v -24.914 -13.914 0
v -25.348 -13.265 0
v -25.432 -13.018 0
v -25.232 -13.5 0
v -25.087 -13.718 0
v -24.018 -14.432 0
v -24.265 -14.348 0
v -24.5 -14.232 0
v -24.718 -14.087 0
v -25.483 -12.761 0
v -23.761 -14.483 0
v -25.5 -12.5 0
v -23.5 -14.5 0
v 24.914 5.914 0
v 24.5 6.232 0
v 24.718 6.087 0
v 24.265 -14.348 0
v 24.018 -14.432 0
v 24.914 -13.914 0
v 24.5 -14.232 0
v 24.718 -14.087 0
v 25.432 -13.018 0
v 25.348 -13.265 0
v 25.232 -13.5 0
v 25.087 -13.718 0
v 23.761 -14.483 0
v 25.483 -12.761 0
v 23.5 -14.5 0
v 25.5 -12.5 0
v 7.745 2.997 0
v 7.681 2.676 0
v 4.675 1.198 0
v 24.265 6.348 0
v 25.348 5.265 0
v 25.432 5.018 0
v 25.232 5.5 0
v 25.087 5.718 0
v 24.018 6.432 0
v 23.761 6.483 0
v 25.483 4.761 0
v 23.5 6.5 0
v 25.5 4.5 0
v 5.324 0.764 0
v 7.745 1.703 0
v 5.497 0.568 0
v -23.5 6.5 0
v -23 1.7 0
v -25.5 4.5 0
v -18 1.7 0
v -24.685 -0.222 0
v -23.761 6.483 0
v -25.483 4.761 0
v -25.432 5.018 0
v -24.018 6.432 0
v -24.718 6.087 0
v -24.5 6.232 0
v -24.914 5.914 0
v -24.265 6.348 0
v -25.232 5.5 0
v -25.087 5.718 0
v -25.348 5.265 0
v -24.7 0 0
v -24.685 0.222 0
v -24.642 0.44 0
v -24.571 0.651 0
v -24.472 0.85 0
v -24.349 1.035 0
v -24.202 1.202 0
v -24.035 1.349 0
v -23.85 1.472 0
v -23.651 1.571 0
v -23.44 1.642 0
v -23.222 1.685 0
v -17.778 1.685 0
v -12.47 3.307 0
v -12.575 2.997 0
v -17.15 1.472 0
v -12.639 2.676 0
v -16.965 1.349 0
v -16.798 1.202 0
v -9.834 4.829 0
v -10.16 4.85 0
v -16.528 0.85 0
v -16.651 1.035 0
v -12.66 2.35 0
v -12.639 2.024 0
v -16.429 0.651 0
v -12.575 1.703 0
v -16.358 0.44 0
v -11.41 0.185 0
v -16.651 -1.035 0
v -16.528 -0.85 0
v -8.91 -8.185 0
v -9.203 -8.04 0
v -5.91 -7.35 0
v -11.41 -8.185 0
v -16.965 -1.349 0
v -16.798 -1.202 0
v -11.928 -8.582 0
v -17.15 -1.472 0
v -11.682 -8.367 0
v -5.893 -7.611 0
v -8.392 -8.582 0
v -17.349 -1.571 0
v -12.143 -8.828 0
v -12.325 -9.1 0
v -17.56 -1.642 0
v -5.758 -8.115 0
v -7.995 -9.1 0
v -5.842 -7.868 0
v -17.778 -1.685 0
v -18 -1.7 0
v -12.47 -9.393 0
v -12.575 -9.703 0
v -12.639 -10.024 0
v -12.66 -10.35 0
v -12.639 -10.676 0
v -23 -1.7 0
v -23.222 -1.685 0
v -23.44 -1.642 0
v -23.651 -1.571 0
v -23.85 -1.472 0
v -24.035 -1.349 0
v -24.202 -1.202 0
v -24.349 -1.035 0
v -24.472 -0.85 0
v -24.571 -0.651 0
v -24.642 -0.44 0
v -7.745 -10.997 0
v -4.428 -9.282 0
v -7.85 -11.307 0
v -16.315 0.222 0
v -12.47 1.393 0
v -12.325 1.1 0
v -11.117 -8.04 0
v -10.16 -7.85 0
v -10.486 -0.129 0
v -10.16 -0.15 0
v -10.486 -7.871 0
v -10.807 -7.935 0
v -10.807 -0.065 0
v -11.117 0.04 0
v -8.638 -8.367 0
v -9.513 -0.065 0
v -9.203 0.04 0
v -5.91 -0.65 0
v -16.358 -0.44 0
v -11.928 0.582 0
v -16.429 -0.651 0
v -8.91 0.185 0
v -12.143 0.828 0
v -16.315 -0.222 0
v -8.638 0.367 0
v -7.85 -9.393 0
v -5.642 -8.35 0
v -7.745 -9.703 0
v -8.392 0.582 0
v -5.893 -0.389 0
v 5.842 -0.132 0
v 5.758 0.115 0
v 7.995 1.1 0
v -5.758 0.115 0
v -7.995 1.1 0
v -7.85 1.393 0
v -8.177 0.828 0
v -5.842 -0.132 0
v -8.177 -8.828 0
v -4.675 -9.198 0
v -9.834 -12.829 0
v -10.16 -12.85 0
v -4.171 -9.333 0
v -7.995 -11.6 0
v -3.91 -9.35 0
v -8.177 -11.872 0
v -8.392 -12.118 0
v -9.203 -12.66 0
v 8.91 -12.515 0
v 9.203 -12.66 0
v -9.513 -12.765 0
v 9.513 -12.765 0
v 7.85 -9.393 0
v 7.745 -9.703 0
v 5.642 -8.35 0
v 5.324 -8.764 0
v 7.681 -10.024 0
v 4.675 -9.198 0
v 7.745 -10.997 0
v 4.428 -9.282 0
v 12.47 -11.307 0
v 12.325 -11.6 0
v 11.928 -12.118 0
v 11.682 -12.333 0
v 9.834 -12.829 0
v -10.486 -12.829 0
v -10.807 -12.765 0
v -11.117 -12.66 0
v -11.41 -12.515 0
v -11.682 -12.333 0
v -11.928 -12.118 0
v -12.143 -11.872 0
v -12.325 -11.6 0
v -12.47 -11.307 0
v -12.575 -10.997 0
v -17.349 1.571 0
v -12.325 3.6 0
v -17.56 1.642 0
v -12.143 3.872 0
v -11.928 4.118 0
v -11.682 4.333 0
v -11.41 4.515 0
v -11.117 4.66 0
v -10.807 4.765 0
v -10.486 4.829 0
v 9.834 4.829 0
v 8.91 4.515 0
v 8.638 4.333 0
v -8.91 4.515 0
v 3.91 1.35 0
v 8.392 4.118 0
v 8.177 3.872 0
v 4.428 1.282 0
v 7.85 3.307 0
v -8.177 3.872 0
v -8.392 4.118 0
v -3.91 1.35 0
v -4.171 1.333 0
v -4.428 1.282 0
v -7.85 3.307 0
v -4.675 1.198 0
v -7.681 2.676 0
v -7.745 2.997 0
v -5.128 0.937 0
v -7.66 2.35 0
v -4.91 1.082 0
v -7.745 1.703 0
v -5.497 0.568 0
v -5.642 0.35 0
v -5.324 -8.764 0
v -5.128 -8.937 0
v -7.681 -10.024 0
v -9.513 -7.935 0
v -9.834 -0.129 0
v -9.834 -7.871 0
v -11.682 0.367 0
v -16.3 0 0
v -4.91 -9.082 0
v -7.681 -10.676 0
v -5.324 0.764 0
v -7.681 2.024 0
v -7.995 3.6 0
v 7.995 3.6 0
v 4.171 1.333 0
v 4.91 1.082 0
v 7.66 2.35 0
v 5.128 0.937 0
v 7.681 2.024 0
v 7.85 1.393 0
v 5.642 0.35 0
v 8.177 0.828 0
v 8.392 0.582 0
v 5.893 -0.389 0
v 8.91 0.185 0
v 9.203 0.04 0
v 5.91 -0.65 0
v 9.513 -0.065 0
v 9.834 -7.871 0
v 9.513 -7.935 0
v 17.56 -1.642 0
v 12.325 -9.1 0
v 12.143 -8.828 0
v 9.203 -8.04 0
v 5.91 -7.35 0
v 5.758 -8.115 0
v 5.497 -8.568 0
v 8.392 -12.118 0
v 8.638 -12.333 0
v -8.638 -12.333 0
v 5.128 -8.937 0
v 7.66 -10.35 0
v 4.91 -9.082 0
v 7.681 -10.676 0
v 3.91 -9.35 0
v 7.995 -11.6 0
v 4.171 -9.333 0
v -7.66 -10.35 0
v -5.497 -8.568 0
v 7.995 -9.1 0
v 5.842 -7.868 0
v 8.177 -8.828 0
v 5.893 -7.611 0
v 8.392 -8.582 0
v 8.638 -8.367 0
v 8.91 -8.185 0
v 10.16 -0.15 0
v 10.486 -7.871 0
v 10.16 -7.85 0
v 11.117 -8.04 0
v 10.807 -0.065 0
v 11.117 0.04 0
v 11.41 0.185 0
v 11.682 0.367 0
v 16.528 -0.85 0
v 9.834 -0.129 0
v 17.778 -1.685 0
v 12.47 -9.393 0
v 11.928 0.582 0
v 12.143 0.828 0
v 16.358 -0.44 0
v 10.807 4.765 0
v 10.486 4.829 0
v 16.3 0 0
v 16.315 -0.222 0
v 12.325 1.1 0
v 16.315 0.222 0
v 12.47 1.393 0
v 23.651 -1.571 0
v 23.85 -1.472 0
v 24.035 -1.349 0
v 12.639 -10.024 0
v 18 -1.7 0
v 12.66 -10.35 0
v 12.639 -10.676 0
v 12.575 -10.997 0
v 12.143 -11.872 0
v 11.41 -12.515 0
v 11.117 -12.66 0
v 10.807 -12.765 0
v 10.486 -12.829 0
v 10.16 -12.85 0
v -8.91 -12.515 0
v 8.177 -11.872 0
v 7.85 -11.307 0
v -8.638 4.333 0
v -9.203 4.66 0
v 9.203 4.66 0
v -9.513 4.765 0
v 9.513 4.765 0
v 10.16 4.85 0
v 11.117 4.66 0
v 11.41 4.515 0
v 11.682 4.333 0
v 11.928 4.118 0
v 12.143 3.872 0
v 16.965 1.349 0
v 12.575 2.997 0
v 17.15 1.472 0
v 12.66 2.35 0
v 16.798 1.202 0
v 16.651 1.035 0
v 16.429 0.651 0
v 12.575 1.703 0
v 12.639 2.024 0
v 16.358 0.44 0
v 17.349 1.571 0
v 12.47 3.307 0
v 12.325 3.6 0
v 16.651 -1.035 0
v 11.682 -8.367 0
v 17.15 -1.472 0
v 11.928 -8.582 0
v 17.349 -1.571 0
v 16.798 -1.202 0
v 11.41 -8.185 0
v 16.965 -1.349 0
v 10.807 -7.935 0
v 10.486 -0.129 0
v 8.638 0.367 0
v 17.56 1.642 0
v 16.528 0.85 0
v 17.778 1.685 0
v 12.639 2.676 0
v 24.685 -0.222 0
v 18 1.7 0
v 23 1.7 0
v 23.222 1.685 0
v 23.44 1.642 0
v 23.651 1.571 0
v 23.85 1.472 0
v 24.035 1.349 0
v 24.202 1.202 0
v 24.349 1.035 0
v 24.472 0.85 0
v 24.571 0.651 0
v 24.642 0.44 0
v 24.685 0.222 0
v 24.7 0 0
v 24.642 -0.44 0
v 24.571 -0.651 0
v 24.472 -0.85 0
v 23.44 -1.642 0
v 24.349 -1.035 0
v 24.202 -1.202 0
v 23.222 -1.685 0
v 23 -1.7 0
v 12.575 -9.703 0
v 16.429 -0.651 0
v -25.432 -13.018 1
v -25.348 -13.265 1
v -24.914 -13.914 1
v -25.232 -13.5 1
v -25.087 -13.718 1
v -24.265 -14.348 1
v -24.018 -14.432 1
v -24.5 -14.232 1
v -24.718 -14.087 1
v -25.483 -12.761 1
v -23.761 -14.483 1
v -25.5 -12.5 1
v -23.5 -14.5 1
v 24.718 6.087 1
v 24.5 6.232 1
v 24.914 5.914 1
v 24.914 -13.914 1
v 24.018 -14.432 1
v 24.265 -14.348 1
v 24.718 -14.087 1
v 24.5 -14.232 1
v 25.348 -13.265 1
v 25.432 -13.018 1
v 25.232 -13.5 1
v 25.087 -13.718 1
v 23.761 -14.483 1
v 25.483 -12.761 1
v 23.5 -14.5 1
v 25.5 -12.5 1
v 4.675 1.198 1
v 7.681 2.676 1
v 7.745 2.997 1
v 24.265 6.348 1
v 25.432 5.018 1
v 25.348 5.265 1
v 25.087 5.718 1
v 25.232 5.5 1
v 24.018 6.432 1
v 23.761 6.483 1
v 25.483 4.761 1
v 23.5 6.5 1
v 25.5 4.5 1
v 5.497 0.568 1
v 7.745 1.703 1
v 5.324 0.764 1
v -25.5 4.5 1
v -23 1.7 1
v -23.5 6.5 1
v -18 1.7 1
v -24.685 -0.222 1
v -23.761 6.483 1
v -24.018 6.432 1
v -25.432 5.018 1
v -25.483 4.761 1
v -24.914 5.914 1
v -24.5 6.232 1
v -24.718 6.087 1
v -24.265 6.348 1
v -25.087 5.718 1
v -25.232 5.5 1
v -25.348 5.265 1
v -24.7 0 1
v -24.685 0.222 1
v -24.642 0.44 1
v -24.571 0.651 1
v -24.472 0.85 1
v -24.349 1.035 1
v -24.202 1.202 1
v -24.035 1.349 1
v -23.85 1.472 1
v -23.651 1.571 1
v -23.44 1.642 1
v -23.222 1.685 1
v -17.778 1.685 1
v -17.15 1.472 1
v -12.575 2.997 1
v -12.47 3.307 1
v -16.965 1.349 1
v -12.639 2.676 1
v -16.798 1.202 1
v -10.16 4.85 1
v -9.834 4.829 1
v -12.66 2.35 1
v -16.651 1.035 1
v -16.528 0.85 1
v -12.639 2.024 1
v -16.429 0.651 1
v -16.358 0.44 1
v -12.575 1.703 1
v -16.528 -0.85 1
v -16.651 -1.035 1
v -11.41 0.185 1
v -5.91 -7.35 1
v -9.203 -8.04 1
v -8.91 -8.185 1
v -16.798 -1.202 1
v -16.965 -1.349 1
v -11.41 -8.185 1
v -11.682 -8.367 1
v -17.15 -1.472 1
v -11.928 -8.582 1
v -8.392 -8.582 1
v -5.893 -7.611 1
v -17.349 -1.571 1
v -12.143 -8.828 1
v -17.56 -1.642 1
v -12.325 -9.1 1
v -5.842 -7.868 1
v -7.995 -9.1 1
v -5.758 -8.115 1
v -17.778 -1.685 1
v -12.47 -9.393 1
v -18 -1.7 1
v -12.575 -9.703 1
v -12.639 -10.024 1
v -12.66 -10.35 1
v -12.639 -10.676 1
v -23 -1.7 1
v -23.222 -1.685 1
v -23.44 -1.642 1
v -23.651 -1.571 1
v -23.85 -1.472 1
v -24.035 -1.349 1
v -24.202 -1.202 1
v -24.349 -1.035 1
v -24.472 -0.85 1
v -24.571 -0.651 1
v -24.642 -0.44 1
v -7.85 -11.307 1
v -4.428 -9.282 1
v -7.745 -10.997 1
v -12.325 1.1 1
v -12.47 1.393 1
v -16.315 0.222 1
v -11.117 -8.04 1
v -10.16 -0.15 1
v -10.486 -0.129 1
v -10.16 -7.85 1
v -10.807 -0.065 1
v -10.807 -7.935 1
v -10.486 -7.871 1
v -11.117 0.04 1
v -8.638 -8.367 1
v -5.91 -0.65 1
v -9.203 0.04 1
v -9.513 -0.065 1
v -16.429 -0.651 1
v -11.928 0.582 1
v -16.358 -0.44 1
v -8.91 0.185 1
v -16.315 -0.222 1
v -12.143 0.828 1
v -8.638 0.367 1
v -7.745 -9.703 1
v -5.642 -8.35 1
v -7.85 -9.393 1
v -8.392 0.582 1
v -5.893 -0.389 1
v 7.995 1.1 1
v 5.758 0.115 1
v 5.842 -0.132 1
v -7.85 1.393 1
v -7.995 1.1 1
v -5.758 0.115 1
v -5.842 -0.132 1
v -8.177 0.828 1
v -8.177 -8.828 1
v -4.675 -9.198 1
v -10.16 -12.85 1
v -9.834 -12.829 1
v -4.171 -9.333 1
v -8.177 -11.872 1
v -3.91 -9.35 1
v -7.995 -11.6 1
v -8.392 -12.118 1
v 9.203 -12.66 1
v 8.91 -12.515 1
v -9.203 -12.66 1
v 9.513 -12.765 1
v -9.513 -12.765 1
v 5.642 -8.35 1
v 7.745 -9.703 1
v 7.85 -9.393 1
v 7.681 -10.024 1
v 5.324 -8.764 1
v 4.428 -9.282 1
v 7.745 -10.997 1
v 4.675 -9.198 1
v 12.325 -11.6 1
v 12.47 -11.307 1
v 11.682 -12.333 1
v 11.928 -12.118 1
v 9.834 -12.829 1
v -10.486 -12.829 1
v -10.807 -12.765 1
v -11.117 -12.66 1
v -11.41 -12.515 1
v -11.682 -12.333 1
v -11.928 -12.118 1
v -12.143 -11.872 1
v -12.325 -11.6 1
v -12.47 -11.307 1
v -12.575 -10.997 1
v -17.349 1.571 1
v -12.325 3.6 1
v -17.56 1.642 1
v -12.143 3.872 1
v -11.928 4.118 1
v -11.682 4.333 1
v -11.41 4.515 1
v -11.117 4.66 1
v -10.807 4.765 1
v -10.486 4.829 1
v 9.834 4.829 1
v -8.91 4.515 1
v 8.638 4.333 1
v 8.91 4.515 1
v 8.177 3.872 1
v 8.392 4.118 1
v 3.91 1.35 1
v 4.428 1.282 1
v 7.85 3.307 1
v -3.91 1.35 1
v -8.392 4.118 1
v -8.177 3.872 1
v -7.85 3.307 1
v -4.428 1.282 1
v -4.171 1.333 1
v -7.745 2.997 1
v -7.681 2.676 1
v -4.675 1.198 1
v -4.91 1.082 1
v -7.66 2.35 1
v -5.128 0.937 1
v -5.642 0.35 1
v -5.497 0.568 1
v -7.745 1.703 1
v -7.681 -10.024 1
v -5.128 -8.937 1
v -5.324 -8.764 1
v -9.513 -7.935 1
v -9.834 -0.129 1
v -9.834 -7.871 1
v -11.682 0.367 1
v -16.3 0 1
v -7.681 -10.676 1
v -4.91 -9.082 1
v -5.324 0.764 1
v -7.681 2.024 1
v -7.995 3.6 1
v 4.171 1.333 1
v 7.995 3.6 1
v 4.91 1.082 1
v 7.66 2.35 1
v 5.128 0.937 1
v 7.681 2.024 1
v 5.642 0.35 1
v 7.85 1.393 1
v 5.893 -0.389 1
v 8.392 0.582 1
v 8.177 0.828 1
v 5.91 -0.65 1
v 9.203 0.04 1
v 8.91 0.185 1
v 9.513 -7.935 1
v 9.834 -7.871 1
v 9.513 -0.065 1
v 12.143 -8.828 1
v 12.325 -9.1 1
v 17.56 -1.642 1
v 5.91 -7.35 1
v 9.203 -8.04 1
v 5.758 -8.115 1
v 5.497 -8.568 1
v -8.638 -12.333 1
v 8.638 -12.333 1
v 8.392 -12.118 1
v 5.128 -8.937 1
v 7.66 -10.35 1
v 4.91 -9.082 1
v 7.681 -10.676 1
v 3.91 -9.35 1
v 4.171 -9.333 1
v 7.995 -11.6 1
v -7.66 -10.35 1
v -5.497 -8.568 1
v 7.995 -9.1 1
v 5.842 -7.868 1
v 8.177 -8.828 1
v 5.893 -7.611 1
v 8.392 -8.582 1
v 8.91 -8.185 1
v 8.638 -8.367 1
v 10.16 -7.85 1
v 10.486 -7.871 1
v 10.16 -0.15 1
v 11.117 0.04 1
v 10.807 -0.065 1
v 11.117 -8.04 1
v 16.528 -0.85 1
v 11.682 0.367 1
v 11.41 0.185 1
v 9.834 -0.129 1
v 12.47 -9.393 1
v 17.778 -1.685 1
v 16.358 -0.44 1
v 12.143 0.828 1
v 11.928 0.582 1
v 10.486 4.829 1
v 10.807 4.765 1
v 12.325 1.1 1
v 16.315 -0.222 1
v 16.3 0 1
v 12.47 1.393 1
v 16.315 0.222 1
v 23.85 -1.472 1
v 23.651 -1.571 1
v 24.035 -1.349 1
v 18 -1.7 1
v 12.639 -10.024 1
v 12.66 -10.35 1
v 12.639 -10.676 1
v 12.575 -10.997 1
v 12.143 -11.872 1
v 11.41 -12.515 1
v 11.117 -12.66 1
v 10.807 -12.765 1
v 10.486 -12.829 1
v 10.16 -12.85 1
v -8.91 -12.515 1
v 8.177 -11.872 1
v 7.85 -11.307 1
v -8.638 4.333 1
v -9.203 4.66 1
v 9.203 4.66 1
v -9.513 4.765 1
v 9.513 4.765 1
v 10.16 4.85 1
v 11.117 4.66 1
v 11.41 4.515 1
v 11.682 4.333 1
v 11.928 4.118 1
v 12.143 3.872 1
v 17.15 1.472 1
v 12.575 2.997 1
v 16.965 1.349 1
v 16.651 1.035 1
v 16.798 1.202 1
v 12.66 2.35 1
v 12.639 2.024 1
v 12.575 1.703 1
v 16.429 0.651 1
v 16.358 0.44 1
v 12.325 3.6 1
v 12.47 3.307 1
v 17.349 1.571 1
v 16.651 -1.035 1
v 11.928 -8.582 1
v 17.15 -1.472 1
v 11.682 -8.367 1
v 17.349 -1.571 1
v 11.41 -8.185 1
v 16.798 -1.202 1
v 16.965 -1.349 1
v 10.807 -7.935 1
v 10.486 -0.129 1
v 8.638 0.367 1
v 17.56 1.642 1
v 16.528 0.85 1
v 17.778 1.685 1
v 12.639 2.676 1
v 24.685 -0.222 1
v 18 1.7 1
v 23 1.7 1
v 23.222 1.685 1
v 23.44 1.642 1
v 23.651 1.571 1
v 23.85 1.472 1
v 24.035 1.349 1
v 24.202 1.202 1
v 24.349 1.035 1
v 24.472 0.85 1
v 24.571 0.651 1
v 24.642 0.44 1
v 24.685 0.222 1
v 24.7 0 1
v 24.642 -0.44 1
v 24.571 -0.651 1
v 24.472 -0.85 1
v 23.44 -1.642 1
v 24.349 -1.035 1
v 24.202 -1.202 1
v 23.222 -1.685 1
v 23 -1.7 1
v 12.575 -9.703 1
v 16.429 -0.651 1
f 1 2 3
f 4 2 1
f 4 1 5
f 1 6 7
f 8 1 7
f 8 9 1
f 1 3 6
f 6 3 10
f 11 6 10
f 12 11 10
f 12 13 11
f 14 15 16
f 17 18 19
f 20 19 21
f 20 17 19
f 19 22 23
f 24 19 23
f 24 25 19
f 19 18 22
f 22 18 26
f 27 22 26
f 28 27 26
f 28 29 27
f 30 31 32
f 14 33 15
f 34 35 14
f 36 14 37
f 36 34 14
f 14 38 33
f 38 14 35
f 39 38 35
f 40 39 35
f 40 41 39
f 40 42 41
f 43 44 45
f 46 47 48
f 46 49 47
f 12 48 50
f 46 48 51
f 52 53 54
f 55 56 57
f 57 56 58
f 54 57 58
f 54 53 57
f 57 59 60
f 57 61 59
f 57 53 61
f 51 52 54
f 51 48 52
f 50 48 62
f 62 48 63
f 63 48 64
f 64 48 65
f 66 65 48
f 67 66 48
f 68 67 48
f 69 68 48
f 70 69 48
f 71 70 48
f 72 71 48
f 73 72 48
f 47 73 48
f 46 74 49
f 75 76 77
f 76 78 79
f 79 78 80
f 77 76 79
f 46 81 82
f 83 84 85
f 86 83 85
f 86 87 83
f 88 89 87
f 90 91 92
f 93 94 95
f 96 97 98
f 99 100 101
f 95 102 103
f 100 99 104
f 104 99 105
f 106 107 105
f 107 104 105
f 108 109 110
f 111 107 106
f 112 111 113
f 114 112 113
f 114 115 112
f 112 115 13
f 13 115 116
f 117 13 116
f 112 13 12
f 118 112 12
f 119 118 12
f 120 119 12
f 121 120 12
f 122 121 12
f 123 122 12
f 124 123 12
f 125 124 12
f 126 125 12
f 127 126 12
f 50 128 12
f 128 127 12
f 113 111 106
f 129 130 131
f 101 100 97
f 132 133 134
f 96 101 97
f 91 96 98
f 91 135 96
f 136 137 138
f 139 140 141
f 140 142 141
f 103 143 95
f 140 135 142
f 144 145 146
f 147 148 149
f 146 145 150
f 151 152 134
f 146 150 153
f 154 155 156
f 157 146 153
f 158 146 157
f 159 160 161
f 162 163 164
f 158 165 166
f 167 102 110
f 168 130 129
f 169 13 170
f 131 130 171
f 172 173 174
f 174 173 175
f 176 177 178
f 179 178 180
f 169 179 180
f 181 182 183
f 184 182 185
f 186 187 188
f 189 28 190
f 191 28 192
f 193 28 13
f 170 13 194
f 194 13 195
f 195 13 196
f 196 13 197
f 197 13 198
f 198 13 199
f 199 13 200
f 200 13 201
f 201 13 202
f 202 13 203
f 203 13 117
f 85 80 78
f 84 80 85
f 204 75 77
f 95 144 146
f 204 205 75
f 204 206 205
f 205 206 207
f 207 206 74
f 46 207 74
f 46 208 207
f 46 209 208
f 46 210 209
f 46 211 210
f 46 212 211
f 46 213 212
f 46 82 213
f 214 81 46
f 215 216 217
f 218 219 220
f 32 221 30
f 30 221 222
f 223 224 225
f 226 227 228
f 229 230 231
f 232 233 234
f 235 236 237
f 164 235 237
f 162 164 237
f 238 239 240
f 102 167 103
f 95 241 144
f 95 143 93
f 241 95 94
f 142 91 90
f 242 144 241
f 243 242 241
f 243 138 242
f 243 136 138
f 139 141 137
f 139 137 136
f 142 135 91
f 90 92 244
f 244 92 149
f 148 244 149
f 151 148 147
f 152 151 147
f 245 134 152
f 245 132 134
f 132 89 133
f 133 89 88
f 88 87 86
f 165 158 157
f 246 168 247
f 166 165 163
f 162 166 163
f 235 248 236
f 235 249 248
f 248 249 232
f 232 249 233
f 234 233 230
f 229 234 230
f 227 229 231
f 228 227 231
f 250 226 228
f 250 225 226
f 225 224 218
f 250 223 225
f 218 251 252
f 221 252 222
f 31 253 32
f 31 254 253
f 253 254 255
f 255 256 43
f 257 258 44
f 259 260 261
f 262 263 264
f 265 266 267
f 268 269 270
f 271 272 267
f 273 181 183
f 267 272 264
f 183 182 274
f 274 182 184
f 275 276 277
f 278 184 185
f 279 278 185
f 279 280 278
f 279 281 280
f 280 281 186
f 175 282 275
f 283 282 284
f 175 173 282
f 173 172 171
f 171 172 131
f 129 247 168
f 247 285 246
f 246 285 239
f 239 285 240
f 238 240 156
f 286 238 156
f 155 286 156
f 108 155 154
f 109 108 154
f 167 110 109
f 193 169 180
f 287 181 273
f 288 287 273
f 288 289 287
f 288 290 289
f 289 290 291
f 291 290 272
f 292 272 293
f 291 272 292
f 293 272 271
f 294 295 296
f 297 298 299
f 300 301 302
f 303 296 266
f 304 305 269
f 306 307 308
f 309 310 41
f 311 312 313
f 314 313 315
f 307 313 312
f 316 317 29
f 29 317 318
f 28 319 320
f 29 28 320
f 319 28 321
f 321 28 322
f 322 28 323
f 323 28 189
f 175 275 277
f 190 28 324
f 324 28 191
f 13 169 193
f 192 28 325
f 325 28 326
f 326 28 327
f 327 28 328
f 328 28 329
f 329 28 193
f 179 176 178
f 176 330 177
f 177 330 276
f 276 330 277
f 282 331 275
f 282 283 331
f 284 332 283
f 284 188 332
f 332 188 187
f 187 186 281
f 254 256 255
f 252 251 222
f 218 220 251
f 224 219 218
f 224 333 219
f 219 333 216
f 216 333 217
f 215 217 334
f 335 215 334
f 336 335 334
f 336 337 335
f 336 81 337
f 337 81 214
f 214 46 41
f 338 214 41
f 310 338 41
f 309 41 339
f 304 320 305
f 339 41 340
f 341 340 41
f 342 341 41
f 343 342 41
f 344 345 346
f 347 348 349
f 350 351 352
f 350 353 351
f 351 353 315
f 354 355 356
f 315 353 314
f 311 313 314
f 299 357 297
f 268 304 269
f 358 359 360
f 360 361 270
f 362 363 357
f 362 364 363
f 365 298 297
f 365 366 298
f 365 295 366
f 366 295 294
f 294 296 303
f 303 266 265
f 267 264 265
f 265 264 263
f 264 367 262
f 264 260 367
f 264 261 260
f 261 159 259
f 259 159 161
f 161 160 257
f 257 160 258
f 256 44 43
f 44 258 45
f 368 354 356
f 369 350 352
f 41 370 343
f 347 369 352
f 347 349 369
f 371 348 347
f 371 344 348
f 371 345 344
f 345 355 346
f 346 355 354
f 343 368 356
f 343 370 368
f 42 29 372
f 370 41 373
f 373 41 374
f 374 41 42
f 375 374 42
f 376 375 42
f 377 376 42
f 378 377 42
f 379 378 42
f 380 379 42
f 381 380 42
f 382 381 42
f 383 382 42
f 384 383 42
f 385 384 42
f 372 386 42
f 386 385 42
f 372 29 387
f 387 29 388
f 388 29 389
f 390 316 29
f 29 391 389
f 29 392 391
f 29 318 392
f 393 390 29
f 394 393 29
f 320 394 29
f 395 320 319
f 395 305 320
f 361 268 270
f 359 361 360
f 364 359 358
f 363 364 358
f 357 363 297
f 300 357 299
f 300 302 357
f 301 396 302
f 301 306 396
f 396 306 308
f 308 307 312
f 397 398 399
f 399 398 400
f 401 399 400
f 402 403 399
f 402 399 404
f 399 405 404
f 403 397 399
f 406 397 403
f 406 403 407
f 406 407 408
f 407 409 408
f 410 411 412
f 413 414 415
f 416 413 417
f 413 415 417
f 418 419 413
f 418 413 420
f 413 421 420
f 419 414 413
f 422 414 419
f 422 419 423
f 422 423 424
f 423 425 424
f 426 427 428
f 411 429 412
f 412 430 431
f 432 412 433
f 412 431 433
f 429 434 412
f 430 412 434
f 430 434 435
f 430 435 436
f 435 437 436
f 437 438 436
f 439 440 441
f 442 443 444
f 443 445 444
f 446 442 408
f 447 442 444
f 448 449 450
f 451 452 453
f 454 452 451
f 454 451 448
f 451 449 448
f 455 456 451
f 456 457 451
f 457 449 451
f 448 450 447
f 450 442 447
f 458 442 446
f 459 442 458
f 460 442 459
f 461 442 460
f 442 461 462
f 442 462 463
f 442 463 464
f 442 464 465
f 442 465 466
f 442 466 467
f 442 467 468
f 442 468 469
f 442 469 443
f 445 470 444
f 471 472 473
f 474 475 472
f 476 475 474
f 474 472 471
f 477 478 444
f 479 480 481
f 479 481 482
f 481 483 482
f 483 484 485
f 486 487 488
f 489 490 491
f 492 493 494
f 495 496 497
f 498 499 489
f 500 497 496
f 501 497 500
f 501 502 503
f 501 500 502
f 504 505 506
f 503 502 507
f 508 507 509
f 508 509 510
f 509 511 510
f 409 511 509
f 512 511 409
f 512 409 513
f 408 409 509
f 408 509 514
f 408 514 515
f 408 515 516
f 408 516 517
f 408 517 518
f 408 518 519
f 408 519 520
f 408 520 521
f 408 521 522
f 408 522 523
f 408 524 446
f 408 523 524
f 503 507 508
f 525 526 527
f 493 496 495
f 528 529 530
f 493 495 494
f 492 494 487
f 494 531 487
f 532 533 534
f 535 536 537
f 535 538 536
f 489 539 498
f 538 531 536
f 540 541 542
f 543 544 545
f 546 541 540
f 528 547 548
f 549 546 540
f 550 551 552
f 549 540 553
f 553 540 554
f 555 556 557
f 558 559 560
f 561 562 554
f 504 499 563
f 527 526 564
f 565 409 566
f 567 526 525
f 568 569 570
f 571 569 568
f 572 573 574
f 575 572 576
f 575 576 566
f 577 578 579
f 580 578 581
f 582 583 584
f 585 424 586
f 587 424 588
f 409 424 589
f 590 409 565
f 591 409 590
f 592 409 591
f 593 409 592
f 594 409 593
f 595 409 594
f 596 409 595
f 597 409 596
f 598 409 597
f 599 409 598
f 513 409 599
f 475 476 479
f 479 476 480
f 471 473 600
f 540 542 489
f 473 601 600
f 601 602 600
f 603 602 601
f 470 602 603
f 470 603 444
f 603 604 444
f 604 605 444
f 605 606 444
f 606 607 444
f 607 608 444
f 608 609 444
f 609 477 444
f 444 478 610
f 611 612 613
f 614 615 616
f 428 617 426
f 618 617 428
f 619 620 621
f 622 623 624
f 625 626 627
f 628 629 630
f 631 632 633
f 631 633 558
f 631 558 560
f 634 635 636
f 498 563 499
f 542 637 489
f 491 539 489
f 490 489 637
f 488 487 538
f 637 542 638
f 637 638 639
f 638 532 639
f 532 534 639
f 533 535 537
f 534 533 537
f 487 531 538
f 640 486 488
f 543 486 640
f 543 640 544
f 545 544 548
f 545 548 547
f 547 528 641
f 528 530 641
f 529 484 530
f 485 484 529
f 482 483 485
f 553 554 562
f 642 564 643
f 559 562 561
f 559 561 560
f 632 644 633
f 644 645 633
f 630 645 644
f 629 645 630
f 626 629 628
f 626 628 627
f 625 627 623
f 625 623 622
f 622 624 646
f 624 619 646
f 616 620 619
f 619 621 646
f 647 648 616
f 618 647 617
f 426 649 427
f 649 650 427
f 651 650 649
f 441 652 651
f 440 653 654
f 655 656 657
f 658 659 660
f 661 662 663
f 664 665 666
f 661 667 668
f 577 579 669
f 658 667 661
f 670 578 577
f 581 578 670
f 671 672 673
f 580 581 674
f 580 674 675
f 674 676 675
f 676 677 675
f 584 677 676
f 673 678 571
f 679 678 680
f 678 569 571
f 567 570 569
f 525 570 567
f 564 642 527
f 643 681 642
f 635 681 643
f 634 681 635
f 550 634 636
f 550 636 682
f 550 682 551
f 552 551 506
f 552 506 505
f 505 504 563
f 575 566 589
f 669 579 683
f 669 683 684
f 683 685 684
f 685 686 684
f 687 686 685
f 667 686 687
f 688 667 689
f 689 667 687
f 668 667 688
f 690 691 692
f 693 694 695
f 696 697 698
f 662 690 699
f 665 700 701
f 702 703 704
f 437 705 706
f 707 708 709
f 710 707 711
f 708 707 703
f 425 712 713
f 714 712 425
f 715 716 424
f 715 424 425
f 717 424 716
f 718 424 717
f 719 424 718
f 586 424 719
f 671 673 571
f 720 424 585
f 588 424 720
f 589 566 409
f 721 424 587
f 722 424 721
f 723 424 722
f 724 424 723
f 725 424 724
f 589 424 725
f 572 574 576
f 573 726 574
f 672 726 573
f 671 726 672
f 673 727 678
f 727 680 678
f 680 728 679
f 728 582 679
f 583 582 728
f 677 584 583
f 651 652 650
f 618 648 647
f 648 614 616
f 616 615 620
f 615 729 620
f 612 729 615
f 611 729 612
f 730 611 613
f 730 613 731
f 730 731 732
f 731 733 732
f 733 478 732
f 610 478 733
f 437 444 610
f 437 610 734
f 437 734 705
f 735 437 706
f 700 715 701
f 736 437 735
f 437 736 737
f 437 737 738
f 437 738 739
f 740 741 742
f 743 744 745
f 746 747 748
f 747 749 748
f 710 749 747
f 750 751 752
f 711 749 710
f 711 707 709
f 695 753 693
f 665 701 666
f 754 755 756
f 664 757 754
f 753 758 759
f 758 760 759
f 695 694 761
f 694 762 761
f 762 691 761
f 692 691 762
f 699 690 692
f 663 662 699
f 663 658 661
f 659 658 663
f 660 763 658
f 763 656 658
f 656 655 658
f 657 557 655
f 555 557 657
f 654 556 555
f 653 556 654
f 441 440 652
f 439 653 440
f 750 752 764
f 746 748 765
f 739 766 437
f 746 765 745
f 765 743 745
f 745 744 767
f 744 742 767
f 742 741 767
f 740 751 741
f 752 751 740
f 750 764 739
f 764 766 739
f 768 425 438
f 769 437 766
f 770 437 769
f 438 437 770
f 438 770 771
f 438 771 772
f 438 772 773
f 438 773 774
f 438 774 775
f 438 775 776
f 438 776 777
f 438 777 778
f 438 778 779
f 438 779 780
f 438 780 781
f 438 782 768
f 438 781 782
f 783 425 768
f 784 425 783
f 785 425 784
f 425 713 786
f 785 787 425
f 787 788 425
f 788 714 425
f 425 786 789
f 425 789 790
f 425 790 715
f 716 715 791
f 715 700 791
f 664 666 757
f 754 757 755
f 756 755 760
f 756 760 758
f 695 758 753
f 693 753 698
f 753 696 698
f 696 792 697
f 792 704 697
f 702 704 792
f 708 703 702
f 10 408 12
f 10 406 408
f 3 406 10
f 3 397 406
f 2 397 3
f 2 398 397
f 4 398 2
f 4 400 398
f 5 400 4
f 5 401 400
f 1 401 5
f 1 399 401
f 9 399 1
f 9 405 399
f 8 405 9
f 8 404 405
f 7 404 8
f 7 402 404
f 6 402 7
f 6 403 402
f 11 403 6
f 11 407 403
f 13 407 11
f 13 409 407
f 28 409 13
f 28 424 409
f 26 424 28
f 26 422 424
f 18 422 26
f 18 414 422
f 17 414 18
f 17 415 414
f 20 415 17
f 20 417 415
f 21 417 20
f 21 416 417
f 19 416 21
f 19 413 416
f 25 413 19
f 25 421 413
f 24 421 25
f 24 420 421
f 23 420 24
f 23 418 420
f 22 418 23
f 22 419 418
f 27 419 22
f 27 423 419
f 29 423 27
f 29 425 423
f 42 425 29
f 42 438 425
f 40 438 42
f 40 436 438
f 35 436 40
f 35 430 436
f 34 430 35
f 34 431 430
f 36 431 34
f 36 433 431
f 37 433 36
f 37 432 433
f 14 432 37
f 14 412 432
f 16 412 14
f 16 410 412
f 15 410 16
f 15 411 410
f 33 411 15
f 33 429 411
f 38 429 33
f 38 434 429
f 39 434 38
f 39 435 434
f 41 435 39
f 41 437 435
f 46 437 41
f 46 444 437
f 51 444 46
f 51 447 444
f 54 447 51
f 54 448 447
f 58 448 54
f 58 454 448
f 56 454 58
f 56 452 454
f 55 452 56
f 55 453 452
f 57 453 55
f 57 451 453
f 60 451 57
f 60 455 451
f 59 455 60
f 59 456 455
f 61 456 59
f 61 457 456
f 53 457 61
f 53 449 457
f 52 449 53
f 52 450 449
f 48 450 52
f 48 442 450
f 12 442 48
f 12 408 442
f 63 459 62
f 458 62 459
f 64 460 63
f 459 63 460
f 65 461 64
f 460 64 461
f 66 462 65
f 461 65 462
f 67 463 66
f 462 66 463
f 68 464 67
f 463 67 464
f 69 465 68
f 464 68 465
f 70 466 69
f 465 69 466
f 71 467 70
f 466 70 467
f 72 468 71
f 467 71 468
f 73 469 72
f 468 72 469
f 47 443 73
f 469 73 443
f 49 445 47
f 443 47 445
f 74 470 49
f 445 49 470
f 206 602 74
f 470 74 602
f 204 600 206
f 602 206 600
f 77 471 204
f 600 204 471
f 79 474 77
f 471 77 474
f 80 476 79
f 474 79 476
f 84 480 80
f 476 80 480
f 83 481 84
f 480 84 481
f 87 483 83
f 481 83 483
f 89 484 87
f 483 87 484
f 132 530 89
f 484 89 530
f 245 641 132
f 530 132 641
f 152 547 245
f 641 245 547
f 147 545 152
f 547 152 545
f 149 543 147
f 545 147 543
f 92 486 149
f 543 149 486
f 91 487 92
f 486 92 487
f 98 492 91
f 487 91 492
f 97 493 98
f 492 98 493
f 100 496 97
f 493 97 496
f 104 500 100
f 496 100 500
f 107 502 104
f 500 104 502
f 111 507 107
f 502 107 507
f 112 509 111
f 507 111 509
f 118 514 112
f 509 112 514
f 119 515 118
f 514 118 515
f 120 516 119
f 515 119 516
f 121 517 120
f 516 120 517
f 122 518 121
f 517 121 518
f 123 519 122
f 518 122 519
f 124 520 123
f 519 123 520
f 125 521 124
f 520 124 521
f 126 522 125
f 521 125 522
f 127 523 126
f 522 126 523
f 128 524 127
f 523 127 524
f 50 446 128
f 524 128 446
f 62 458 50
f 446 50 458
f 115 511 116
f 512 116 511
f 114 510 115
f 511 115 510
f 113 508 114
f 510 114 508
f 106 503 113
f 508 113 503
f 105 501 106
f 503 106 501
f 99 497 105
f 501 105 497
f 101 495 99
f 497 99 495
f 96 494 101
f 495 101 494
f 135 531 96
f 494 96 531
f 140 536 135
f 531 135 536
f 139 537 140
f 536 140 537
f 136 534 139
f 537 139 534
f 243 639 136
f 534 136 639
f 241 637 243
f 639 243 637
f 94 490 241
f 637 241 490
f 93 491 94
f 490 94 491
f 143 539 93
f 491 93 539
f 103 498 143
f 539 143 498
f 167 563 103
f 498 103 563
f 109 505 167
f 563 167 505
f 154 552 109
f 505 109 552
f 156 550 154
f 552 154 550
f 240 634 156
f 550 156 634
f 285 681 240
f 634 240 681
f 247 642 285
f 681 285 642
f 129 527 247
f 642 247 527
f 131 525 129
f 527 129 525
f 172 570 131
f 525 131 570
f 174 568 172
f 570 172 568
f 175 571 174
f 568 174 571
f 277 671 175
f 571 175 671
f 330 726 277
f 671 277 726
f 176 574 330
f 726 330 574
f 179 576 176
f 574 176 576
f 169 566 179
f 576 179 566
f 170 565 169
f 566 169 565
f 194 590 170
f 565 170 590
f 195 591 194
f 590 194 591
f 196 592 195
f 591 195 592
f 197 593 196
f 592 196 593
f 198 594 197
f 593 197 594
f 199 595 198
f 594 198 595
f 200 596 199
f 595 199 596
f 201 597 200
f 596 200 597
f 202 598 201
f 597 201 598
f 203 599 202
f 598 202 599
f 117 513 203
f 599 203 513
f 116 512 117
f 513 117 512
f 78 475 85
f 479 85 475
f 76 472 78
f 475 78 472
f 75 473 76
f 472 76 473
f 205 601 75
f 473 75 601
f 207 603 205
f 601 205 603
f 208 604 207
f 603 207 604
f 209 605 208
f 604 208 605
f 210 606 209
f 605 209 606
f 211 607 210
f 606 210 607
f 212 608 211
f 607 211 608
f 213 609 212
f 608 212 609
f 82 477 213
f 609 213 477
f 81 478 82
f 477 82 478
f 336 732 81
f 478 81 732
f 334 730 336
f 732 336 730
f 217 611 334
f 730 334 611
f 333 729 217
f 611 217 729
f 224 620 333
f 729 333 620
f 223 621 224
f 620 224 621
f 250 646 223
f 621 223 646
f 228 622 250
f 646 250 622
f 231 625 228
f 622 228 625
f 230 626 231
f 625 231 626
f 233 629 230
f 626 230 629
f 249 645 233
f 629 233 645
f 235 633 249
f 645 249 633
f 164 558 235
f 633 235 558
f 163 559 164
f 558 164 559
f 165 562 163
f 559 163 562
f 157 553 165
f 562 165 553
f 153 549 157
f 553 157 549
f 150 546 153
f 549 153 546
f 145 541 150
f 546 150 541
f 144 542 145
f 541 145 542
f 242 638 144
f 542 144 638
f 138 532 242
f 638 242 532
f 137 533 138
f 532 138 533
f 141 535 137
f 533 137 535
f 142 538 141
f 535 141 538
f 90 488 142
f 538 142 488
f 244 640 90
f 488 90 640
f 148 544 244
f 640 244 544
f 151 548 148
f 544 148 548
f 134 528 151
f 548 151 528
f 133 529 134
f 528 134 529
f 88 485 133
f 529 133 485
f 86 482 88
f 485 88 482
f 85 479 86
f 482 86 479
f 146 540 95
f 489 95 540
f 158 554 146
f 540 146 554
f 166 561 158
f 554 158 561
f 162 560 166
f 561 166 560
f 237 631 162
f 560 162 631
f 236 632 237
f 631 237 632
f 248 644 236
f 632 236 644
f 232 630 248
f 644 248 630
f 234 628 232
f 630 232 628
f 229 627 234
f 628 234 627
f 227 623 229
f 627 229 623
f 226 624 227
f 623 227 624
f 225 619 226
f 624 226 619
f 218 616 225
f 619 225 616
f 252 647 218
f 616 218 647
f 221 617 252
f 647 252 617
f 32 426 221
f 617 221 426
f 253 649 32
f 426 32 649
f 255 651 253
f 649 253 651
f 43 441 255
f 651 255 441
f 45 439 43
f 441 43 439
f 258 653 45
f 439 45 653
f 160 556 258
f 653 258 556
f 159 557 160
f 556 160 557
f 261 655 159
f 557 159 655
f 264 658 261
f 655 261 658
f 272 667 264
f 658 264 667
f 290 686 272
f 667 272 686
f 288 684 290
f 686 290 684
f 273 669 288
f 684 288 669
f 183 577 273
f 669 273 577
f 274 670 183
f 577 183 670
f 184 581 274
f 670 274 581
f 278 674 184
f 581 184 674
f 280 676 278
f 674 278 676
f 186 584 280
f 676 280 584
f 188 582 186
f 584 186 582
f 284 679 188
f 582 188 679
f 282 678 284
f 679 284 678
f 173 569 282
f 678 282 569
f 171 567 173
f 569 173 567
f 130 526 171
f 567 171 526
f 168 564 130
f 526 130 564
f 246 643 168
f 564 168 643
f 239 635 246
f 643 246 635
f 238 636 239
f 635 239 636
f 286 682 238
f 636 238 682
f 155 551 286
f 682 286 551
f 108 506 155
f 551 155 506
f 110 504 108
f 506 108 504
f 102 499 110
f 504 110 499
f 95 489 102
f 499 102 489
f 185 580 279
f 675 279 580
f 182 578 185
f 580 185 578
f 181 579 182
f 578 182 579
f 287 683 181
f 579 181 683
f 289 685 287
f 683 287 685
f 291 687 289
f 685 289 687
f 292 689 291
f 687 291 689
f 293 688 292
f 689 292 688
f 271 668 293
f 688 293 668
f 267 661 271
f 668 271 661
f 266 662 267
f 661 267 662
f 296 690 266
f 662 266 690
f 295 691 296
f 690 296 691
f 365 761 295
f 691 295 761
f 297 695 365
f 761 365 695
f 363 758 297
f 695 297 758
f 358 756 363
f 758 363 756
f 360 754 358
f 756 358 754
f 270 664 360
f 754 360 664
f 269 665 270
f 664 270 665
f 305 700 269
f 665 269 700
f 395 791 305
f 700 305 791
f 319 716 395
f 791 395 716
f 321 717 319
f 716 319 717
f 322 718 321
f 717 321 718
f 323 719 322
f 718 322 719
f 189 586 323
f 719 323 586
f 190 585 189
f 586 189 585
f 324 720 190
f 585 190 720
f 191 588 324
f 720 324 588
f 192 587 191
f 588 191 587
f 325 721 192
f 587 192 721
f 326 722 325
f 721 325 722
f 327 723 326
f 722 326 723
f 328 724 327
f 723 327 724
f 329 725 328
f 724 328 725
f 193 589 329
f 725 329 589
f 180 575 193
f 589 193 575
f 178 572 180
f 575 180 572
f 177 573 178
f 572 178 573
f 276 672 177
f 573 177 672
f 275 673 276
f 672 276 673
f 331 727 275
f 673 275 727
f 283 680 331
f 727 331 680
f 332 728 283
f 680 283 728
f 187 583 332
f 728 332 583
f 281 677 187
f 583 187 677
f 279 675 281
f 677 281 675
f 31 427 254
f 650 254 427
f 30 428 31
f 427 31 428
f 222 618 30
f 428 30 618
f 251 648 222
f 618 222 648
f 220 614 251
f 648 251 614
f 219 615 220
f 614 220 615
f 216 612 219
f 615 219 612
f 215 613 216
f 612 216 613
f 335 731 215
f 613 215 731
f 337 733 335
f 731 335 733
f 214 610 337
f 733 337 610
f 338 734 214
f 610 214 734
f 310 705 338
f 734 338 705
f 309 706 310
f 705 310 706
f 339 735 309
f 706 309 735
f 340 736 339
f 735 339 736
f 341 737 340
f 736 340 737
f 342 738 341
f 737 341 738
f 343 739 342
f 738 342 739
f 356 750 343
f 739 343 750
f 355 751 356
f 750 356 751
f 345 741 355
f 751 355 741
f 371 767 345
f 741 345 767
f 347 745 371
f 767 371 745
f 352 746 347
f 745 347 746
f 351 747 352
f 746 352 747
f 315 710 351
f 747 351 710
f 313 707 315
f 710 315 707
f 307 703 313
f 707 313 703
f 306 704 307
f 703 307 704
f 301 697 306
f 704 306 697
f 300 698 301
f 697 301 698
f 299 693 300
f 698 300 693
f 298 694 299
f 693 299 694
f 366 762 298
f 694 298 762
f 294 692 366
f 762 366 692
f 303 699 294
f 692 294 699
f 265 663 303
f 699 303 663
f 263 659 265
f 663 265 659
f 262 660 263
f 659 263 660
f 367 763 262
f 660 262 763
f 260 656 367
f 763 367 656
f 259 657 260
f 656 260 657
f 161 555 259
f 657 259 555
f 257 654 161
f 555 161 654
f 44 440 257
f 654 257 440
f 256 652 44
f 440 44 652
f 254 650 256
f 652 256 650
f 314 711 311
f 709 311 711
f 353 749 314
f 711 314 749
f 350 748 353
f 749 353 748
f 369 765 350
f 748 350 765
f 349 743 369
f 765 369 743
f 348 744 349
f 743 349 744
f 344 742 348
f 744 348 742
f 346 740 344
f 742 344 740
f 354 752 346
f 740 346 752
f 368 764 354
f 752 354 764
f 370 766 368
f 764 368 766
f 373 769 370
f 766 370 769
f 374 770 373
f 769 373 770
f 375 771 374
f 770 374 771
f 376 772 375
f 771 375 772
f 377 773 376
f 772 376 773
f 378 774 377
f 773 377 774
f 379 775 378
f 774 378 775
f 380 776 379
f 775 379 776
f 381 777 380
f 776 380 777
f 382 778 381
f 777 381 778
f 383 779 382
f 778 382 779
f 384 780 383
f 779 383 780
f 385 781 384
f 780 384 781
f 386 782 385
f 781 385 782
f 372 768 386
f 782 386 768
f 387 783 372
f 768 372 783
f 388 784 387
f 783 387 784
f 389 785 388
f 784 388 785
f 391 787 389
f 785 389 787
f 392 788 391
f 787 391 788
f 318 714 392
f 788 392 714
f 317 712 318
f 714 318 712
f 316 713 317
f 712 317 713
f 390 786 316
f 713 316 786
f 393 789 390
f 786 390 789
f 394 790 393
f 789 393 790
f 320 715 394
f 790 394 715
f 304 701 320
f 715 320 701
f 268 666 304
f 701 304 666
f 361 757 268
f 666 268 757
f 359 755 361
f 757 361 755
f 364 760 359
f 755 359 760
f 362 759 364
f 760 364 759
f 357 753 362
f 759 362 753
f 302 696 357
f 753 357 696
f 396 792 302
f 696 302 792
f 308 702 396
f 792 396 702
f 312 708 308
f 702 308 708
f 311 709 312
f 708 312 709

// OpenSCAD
// file: box.scad
// Stand-in for the 63 x 58 x 35 ABS box (black or clear lid), for assemblies. Not a print.
// Origin: centre of the inside floor. x along the 63 side, y along the 58 side, z up.
// Numbers are the vendor's or read off vendor photos; README lists which. None calipered.

/* [Box, vendor] */
box_l = 63;          // outer, x
box_w = 58;          // outer, y
box_h = 35;          // outer, lid on
col_clear = 39;      // clear wall between corner columns, both walls

/* [Box, read off photos] */
box_wall = 2.5;      // gives the vendor's 53 inside across y
box_floor = 3;
lid_h = 8.5;         // lid outer height
lid_top = 2.5;       // lid plate thickness
lid_lip = 4;         // lid's inner rim, in from the inside wall face
gasket_step = 4.5;   // thickened wall band under the seam
gasket_in = 1.5;     // how far that band stands in from the wall
boss_pitch = 41;     // floor screw bosses, along x, centred (39 to 42.5 by pixel scale)
boss_d = 6;
boss_h = 4;
boss_hole = 2.5;     // takes an M3 self-tapper (guess)
boss_wing = 10;      // wing length across y
boss_wing_t = 2;
boss_wing_h = 2.5;

in_l = box_l - 2*box_wall;                 // 58
in_w = box_w - 2*box_wall;                 // 53
col_x = (in_l - col_clear) / 2;            // 9.5, column size along x
col_y = (in_w - col_clear) / 2;            // 7, column size along y
rim_z = box_h - lid_h - box_floor;         // 23.5, seam above the inside floor
ceil_z = box_h - lid_top - box_floor;      // 29.5, lid underside above the inside floor
wall_top_z = rim_z - gasket_step;          // 19, top of the plain wall a nut can seat on

module box_columns(h = rim_z) {
    for (sx = [-1, 1], sy = [-1, 1]) scale([sx, sy, 1])
        translate([in_l/2 - col_x, in_w/2 - col_y, 0]) cube([col_x, col_y, h]);
}

module box_bosses() {
    for (sx = [-1, 1]) translate([sx*boss_pitch/2, 0, 0]) difference() {
        union() {
            cylinder(d = boss_d, h = boss_h, $fn = 32);
            translate([-boss_wing_t/2, -boss_wing/2, 0]) cube([boss_wing_t, boss_wing, boss_wing_h]);
        }
        translate([0, 0, 0.5]) cylinder(d = boss_hole, h = boss_h, $fn = 24);
    }
}

// holes: list of [wall, along, z, dia]; wall is "x+", "x-", "y+", "y-"; along is the position along that wall from its centre
module wall_hole(h) {
    wall = h[0]; a = h[1]; z = h[2]; d = h[3];
    if (wall == "y+" || wall == "y-") translate([a, (wall == "y+" ? 1 : -1) * (in_w/2 + box_wall/2), z])
        rotate([90, 0, 0]) cylinder(d = d, h = box_wall + 4, center = true, $fn = 48);
    else translate([(wall == "x+" ? 1 : -1) * (in_l/2 + box_wall/2), a, z])
        rotate([0, 90, 0]) cylinder(d = d, h = box_wall + 4, center = true, $fn = 48);
}

module box_body(holes = []) {
    difference() {
        translate([-box_l/2, -box_w/2, -box_floor]) cube([box_l, box_w, box_floor + rim_z]);
        translate([-in_l/2, -in_w/2, 0]) cube([in_l, in_w, rim_z + 1]);
        for (h = holes) wall_hole(h);
    }
    difference() {
        union() {
            box_columns();
            translate([0, 0, wall_top_z]) difference() {      // gasket band
                translate([-in_l/2, -in_w/2, 0]) cube([in_l, in_w, gasket_step]);
                translate([-in_l/2 + gasket_in, -in_w/2 + gasket_in, -1]) cube([in_l - 2*gasket_in, in_w - 2*gasket_in, gasket_step + 2]);
            }
        }
        for (h = holes) wall_hole(h);
    }
    box_bosses();
}

module box_lid() {
    translate([0, 0, rim_z]) difference() {
        translate([-box_l/2, -box_w/2, 0]) cube([box_l, box_w, lid_h]);
        translate([-in_l/2 + lid_lip, -in_w/2 + lid_lip, -1]) cube([in_l - 2*lid_lip, in_w - 2*lid_lip, lid_h - lid_top + 1]);
    }
}

// The space parts may occupy: the cross-shaped floor up to the gasket band, then the lid's recess.
module box_free() {
    difference() {
        translate([-in_l/2, -in_w/2, 0]) cube([in_l, in_w, wall_top_z]);
        box_columns(wall_top_z + 1);
    }
    translate([-in_l/2 + gasket_in, -in_w/2 + gasket_in, wall_top_z]) difference() {
        cube([in_l - 2*gasket_in, in_w - 2*gasket_in, gasket_step]);
        translate([-gasket_in, -gasket_in, -1]) intersection() { translate([gasket_in, gasket_in, 0]) cube([in_l - 2*gasket_in, in_w - 2*gasket_in, 10]); box_columns(10); }
    }
    translate([-in_l/2 + lid_lip, -in_w/2 + lid_lip, rim_z]) cube([in_l - 2*lid_lip, in_w - 2*lid_lip, ceil_z - rim_z]);
}
// file: model.scad
// Carrier for two stacked Adafruit STEMMA QT boards (25.4 x 17.78, holes 20.32 x 12.7) in the 63 x 58 x 35 box.
// Screws to the box's two floor bosses; four M2.5 x 20 screws come up through the posts, the lower board,
// the spacer and the upper board, with nuts on top. Print as shown: plate on the bed, posts up, no supports.
include <box.scad>
part = "carrier";    // carrier | spacer

/* [Plate] */
plate_l = 51;        // x; inside the 58 floor, clear of the short walls
plate_w = 21;        // y
plate_t = 2;
plate_y = -4;        // plate and stack centre, off the box centre, away from the connector wall
corner_r = 2;

/* [Floor bosses] */
slot_w = 3.4;        // M3 self-tapper clearance
slot_play = 2.5;     // each way along x; covers the 39 to 42.5 guess for the boss pitch

/* [Board bays] */
hole_dx = 20.32;     // Adafruit board file
hole_dy = 12.7;
post_h = 3;          // lower board's underside above the plate; clears its solder joints
post_d = 5.5;
screw_d = 2.9;       // M2.5 clearance, printed
head_d = 5;          // M2.5 pan head, in a pocket under the plate
head_h = 1.2;        // pocket depth; the rest of the head hangs in the 4 mm under the plate
spacer_h = 8;        // between the boards; room for the lower board's parts and its plugs
spacer_d = 5;
spacer_web = 1.6;    // bars joining the spacer tubes in pairs

/* [Hidden] */
$fn = 48;
posts = [for (sx = [-1, 1], sy = [-1, 1]) [sx*hole_dx/2, plate_y + sy*hole_dy/2]];

module rrect(l, w, r) { hull() for (sx = [-1, 1], sy = [-1, 1]) translate([sx*(l/2 - r), sy*(w/2 - r)]) circle(r = r); }

module carrier() {
    difference() {
        union() {
            linear_extrude(plate_t) union() {
                translate([0, plate_y]) rrect(plate_l, plate_w, corner_r);
                rrect(plate_l, 10, corner_r);                      // boss tabs sit on the box centre line
            }
            for (p = posts) translate([p[0], p[1], 0]) cylinder(d = post_d, h = plate_t + post_h);
        }
        for (sx = [-1, 1]) translate([sx*boss_pitch/2, 0, -1]) linear_extrude(plate_t + 2)
            hull() for (d = [-slot_play, slot_play]) translate([d, 0]) circle(d = slot_w);
        for (p = posts) translate([p[0], p[1], -1]) {
            cylinder(d = screw_d, h = plate_t + post_h + 2);
            cylinder(d = head_d, h = head_h + 1);
        }
        translate([0, plate_y, -1]) linear_extrude(plate_t + 2) rrect(hole_dx - post_d - 3, hole_dy - 2, 2);   // lightening window
    }
}

module spacer() {
    difference() {
        union() {
            for (p = posts) translate([p[0], p[1] - plate_y, 0]) cylinder(d = spacer_d, h = spacer_h);
            for (sy = [-1, 1]) translate([-hole_dx/2, sy*hole_dy/2 - spacer_web/2, 0]) cube([hole_dx, spacer_web, spacer_web]);   // bars on the long sides only: the ends stay open for the plugs
        }
        for (p = posts) translate([p[0], p[1] - plate_y, -1]) cylinder(d = screw_d, h = spacer_h + 2);
    }
}

if (part == "carrier") carrier();
if (part == "spacer") spacer();
// main file
// Fit-check gauge, generated: shop gauge projects/small-box-sensors "carrier()" 1
// Two horizontal slices of the finished part, re-extruded thin. Rerun the command to change it;
// a hand-written gauge replaces this file and drops this first line.
use <model.scad>

/* [Gauge] */
z_plate = 1;   // slice height through the plate: its outline and through-holes
z_wall = -1;    // slice height through the walls the object sits against; below 0 for none
gauge_t = 1;       // gauge plate thickness
gauge_rise = 2;    // gauge wall height above the plate

module gauge_slice() {
    linear_extrude(gauge_t) projection(cut = true) translate([0, 0, -z_plate]) children();
    if (z_wall >= 0) translate([0, 0, gauge_t - 0.01]) linear_extrude(gauge_rise + 0.01) projection(cut = true) translate([0, 0, -z_wall]) children();
}

gauge_slice() carrier();
